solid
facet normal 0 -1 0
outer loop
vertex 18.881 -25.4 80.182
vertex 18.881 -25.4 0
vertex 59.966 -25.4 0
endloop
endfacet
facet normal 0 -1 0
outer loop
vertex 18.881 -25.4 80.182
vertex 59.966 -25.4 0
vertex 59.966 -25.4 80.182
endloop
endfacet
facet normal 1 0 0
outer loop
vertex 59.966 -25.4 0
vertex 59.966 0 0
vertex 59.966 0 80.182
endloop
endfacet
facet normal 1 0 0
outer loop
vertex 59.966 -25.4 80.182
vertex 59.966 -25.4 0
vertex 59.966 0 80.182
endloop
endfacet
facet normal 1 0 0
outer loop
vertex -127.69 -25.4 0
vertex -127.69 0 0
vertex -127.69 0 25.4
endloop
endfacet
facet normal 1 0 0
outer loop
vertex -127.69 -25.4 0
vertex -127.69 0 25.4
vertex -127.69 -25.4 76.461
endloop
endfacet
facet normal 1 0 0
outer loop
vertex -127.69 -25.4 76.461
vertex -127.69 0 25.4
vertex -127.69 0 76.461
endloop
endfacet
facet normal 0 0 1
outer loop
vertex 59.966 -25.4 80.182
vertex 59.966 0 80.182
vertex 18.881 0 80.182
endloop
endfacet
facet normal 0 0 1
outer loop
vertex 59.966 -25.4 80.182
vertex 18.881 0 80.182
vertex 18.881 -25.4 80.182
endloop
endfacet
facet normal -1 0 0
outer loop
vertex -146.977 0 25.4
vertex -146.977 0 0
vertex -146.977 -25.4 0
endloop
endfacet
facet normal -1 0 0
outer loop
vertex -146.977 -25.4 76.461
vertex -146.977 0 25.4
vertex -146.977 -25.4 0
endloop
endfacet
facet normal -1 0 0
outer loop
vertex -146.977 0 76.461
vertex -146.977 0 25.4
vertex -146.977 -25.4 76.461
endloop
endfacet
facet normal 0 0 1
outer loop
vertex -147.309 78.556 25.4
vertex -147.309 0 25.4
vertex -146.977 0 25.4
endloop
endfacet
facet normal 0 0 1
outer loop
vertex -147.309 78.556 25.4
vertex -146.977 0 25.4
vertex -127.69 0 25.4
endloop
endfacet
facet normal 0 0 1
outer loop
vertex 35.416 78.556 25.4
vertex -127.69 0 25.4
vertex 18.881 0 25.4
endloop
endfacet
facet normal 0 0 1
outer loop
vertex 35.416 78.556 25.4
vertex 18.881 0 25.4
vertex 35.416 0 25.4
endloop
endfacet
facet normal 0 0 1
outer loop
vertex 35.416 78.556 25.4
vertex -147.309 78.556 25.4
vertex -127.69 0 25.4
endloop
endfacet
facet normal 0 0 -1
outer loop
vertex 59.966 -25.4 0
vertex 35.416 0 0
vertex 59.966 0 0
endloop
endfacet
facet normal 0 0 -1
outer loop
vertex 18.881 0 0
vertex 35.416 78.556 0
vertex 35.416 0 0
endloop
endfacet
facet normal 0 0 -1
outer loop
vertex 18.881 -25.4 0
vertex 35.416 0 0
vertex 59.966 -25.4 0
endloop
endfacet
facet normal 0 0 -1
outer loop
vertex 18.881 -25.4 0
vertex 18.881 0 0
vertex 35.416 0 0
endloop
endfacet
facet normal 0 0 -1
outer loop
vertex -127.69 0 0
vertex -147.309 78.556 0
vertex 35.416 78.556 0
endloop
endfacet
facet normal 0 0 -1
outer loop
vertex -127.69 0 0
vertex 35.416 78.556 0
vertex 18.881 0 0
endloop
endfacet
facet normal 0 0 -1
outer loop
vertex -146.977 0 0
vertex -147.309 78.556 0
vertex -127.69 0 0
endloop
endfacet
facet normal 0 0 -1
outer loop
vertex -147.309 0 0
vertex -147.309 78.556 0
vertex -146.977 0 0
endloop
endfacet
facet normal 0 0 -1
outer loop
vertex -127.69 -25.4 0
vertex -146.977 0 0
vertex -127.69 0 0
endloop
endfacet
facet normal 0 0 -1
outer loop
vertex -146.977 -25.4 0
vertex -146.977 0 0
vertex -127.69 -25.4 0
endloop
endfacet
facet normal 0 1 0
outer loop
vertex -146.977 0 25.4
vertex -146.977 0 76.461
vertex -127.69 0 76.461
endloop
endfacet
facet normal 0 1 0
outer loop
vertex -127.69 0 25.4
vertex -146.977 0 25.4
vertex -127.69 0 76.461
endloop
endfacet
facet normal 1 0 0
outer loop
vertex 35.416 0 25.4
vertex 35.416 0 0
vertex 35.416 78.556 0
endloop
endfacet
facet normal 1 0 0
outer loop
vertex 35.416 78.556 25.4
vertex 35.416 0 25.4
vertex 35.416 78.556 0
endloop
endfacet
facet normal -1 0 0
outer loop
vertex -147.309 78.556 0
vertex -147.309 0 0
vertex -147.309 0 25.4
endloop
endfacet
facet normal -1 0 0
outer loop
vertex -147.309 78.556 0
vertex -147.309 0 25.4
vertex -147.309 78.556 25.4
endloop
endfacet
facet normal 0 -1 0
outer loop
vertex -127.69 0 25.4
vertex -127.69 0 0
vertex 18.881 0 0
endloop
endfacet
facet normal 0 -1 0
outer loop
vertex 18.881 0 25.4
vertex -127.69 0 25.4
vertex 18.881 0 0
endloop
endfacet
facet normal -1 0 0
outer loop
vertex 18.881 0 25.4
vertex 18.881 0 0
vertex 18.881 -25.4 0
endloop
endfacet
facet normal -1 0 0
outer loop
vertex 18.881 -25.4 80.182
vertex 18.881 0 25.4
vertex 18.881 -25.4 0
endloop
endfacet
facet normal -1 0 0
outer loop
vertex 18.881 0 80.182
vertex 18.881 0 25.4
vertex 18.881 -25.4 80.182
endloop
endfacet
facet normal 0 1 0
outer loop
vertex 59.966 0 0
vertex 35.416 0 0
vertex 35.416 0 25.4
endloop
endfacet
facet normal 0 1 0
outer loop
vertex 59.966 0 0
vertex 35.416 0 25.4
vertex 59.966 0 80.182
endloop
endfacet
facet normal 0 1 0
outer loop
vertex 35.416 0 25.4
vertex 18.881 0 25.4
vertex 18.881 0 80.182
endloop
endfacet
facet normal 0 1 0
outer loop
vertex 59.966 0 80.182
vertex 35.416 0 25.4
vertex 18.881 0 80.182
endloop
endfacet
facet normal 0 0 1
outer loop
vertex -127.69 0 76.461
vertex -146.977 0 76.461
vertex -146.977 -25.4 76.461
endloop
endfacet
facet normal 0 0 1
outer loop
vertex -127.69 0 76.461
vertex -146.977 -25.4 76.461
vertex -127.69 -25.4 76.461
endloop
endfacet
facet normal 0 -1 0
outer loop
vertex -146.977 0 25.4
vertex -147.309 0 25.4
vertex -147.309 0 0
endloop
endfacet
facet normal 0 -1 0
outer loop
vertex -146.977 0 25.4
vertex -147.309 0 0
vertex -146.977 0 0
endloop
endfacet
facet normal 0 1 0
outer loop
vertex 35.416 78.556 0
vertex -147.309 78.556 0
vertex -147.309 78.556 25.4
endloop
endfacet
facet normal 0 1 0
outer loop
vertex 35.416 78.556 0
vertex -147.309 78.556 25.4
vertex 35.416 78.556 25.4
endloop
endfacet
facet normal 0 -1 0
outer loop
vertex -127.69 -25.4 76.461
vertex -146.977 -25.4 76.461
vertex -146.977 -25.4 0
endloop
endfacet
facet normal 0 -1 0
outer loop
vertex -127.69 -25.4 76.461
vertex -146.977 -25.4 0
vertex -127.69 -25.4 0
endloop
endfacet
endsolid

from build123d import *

# Parameters (mm, degrees)
F0_W     = 182.7251240611
F0_H     = 78.556381166
F1_DEPTH = 25.4
F2_W     = 19.2864239216
F2_H     = 76.4613673091
F3_DEPTH = 25.4
F4_W     = 15.6851392239
F4_H     = 80.182261765
F5_DEPTH = 25.4
F6_DEPTH = 25.4


with BuildPart() as f1:
    # F0 (on Top) → F1 (new body)
    with BuildSketch(Plane.XY):
        with Locations((-55.9463985264, 39.278190583)):
            Rectangle(F0_W, F0_H)
    extrude(amount=F1_DEPTH)

    # F2 (on Front) → F3 (join)
    with BuildSketch(Plane.XZ):
        with Locations((-137.3333185911, 38.2306836545)):
            Rectangle(F2_W, F2_H)
    extrude(amount=F3_DEPTH)

    # F4 (on Front) → F5 (join)
    with BuildSketch(Plane.XZ):
        with Locations((26.723430492, 40.0911308825)):
            Rectangle(F4_W, F4_H)
    extrude(amount=F5_DEPTH)

    # F6 (add): a face of the model
    f6_faces = [f1.faces().sort_by_distance(p)[0] for p in [
        (34.566000104, -12.7, 40.0911308825),
    ]]
    extrude(f6_faces, amount=F6_DEPTH)


solid = f1.part
